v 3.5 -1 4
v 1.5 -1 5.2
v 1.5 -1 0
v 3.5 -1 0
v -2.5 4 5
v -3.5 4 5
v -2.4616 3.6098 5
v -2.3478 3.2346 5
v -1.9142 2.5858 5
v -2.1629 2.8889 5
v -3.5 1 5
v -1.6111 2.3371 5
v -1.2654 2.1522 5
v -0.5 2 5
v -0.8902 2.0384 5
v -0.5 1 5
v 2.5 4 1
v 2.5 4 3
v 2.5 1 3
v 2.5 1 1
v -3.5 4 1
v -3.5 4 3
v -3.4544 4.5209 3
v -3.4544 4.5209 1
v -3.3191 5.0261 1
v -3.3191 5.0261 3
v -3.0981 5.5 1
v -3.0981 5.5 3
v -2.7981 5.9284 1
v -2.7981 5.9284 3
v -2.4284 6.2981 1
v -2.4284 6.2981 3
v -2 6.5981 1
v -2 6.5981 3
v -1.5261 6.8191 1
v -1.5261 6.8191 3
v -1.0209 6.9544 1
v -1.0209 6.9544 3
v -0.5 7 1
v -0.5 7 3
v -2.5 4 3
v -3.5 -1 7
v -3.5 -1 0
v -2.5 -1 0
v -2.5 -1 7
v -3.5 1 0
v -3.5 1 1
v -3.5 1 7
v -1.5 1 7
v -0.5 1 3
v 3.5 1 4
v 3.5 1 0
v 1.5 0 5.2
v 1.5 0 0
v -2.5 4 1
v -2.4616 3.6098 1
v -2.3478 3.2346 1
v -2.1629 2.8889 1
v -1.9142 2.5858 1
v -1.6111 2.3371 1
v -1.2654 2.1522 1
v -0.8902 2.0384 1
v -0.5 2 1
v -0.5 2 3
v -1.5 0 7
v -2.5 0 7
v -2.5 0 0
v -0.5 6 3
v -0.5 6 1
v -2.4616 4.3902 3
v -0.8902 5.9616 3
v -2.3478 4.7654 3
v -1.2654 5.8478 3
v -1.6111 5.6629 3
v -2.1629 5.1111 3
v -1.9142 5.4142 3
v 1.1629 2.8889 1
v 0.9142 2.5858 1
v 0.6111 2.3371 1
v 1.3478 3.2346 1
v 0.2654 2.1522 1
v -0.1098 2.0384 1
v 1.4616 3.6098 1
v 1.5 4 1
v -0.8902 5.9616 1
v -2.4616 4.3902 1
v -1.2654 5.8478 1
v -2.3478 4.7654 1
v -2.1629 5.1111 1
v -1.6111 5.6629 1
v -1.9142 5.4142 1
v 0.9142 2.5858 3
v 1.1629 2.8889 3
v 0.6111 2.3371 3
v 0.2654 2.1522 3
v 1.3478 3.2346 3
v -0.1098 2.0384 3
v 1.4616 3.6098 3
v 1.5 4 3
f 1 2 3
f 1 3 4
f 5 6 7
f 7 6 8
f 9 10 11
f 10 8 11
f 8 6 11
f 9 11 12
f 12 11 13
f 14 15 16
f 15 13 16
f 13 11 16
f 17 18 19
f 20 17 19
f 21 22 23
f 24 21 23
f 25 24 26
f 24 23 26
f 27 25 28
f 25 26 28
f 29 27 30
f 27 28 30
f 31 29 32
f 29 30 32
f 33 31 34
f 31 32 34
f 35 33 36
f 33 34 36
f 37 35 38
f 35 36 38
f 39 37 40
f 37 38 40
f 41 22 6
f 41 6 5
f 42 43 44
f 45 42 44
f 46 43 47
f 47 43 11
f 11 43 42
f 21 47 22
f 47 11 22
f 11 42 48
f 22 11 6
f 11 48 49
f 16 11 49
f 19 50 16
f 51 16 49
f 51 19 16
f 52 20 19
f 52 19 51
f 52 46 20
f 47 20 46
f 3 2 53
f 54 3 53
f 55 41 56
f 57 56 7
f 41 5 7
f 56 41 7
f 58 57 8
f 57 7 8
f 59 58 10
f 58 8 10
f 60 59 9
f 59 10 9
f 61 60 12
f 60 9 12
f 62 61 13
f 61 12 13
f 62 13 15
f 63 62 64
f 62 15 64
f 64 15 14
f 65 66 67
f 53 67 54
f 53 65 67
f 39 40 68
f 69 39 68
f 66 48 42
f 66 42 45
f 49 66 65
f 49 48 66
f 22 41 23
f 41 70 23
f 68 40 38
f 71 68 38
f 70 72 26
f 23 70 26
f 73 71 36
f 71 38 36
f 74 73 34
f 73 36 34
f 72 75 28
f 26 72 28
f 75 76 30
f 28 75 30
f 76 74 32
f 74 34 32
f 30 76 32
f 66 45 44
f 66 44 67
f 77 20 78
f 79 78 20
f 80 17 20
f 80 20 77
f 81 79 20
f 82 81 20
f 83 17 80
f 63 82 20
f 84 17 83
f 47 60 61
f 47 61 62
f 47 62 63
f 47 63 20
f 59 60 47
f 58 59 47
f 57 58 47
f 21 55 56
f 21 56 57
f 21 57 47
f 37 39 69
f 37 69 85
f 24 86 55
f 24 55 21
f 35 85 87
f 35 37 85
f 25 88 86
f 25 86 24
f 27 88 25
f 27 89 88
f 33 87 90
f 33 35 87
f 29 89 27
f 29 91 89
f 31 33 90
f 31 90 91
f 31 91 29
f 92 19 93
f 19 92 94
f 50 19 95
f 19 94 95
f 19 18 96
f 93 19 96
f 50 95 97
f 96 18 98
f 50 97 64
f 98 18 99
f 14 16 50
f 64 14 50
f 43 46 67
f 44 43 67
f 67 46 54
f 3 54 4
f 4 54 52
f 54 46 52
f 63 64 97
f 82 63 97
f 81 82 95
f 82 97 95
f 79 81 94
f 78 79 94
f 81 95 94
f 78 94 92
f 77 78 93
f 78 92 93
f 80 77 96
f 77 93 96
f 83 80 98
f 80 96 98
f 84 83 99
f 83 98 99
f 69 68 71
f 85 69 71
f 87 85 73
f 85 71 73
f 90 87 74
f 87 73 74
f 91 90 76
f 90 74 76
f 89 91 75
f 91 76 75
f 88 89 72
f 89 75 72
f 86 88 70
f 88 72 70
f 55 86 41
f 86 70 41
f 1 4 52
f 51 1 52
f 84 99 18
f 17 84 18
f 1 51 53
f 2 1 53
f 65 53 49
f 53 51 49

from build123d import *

# Parameters (mm, degrees)
SKETCH1_W           = 7
SKETCH1_H           = 2
BOSS_EXTRUDE1_DEPTH = 7
CUT_EXTRUDE1_DEPTH  = 3
SKETCH3_W           = 4
SKETCH3_H           = 1
CUT_EXTRUDE2_DEPTH  = 8
SKETCH4_W           = 3
SKETCH4_H           = 2
BOSS_EXTRUDE2_DEPTH = 3
BOSS_EXTRUDE4_DEPTH = 2
SKETCH7_R           = 2
CUT_EXTRUDE4_DEPTH  = 5


with BuildPart() as part:
    # Sketch1 → Boss-Extrude1 (new body)
    with BuildSketch(Plane.XY):
        Rectangle(SKETCH1_W, SKETCH1_H)
    extrude(amount=BOSS_EXTRUDE1_DEPTH)

    # Sketch2 → Cut-Extrude1 (cut, through all)
    with BuildSketch(Plane(origin=(0, 1, 0), x_dir=(1, 0, 0), z_dir=(0, 1, 0))):
        Polygon((3.5, -4), (-1.5, -7), (3.5, -7), align=None)
    extrude(amount=-CUT_EXTRUDE1_DEPTH, mode=Mode.SUBTRACT)

    # Sketch3 → Cut-Extrude2 (cut, through all)
    with BuildSketch(Plane.XY.offset(7)):
        with Locations((-0.5, -0.5)):
            Rectangle(SKETCH3_W, SKETCH3_H)
    extrude(amount=-CUT_EXTRUDE2_DEPTH, mode=Mode.SUBTRACT)

    # Sketch4 → Boss-Extrude2 (add)
    with BuildSketch(Plane(origin=(0, 1, 0), x_dir=(1, 0, 0), z_dir=(0, 1, 0))):
        with Locations((-2, -4)):
            Rectangle(SKETCH4_W, SKETCH4_H)
    extrude(amount=BOSS_EXTRUDE2_DEPTH)

    # Sketch6 → Boss-Extrude4 (add)
    with BuildSketch(Plane(origin=(0, 0, 3), x_dir=(-1, 0, 0), z_dir=(0, 0, -1))):
        with BuildLine():
            Line((0.5, 2), (0.5, 1))
            ThreePointArc((0.5, 1), (2.621320344, 1.878679656), (3.5, 4))
            Line((3.5, 4), (2.5, 4))
            ThreePointArc((2.5, 4), (1.914213562, 2.585786438), (0.5, 2))
        make_face()
        with BuildLine():
            Line((-2.5, 1), (0.5, 1))
            Line((0.5, 1), (0.5, 2))
            ThreePointArc((0.5, 2), (-0.914213562, 2.585786438), (-1.5, 4))
            Line((-1.5, 4), (-2.5, 4))
            Line((-2.5, 4), (-2.5, 1))
        make_face()
        with BuildLine():
            Line((2.5, 4), (3.5, 4))
            ThreePointArc((3.5, 4), (2.621320344, 6.121320344), (0.5, 7))
            Line((0.5, 7), (0.5, 6))
            ThreePointArc((0.5, 6), (1.914213562, 5.414213562), (2.5, 4))
        make_face()
        with BuildLine():
            ThreePointArc((3.5, 4), (2.621320344, 1.878679656), (0.5, 1))
            Line((0.5, 1), (3.5, 1))
            Line((3.5, 1), (3.5, 4))
        make_face()
    extrude(amount=BOSS_EXTRUDE4_DEPTH)

    # Sketch7 → Cut-Extrude4 (cut)
    with BuildSketch(Plane(origin=(0, 0, 1), x_dir=(-1, 0, 0), z_dir=(0, 0, -1))):
        with Locations((0.5, 4)):
            Circle(SKETCH7_R)
    extrude(amount=-CUT_EXTRUDE4_DEPTH, mode=Mode.SUBTRACT)


solid = part.part
